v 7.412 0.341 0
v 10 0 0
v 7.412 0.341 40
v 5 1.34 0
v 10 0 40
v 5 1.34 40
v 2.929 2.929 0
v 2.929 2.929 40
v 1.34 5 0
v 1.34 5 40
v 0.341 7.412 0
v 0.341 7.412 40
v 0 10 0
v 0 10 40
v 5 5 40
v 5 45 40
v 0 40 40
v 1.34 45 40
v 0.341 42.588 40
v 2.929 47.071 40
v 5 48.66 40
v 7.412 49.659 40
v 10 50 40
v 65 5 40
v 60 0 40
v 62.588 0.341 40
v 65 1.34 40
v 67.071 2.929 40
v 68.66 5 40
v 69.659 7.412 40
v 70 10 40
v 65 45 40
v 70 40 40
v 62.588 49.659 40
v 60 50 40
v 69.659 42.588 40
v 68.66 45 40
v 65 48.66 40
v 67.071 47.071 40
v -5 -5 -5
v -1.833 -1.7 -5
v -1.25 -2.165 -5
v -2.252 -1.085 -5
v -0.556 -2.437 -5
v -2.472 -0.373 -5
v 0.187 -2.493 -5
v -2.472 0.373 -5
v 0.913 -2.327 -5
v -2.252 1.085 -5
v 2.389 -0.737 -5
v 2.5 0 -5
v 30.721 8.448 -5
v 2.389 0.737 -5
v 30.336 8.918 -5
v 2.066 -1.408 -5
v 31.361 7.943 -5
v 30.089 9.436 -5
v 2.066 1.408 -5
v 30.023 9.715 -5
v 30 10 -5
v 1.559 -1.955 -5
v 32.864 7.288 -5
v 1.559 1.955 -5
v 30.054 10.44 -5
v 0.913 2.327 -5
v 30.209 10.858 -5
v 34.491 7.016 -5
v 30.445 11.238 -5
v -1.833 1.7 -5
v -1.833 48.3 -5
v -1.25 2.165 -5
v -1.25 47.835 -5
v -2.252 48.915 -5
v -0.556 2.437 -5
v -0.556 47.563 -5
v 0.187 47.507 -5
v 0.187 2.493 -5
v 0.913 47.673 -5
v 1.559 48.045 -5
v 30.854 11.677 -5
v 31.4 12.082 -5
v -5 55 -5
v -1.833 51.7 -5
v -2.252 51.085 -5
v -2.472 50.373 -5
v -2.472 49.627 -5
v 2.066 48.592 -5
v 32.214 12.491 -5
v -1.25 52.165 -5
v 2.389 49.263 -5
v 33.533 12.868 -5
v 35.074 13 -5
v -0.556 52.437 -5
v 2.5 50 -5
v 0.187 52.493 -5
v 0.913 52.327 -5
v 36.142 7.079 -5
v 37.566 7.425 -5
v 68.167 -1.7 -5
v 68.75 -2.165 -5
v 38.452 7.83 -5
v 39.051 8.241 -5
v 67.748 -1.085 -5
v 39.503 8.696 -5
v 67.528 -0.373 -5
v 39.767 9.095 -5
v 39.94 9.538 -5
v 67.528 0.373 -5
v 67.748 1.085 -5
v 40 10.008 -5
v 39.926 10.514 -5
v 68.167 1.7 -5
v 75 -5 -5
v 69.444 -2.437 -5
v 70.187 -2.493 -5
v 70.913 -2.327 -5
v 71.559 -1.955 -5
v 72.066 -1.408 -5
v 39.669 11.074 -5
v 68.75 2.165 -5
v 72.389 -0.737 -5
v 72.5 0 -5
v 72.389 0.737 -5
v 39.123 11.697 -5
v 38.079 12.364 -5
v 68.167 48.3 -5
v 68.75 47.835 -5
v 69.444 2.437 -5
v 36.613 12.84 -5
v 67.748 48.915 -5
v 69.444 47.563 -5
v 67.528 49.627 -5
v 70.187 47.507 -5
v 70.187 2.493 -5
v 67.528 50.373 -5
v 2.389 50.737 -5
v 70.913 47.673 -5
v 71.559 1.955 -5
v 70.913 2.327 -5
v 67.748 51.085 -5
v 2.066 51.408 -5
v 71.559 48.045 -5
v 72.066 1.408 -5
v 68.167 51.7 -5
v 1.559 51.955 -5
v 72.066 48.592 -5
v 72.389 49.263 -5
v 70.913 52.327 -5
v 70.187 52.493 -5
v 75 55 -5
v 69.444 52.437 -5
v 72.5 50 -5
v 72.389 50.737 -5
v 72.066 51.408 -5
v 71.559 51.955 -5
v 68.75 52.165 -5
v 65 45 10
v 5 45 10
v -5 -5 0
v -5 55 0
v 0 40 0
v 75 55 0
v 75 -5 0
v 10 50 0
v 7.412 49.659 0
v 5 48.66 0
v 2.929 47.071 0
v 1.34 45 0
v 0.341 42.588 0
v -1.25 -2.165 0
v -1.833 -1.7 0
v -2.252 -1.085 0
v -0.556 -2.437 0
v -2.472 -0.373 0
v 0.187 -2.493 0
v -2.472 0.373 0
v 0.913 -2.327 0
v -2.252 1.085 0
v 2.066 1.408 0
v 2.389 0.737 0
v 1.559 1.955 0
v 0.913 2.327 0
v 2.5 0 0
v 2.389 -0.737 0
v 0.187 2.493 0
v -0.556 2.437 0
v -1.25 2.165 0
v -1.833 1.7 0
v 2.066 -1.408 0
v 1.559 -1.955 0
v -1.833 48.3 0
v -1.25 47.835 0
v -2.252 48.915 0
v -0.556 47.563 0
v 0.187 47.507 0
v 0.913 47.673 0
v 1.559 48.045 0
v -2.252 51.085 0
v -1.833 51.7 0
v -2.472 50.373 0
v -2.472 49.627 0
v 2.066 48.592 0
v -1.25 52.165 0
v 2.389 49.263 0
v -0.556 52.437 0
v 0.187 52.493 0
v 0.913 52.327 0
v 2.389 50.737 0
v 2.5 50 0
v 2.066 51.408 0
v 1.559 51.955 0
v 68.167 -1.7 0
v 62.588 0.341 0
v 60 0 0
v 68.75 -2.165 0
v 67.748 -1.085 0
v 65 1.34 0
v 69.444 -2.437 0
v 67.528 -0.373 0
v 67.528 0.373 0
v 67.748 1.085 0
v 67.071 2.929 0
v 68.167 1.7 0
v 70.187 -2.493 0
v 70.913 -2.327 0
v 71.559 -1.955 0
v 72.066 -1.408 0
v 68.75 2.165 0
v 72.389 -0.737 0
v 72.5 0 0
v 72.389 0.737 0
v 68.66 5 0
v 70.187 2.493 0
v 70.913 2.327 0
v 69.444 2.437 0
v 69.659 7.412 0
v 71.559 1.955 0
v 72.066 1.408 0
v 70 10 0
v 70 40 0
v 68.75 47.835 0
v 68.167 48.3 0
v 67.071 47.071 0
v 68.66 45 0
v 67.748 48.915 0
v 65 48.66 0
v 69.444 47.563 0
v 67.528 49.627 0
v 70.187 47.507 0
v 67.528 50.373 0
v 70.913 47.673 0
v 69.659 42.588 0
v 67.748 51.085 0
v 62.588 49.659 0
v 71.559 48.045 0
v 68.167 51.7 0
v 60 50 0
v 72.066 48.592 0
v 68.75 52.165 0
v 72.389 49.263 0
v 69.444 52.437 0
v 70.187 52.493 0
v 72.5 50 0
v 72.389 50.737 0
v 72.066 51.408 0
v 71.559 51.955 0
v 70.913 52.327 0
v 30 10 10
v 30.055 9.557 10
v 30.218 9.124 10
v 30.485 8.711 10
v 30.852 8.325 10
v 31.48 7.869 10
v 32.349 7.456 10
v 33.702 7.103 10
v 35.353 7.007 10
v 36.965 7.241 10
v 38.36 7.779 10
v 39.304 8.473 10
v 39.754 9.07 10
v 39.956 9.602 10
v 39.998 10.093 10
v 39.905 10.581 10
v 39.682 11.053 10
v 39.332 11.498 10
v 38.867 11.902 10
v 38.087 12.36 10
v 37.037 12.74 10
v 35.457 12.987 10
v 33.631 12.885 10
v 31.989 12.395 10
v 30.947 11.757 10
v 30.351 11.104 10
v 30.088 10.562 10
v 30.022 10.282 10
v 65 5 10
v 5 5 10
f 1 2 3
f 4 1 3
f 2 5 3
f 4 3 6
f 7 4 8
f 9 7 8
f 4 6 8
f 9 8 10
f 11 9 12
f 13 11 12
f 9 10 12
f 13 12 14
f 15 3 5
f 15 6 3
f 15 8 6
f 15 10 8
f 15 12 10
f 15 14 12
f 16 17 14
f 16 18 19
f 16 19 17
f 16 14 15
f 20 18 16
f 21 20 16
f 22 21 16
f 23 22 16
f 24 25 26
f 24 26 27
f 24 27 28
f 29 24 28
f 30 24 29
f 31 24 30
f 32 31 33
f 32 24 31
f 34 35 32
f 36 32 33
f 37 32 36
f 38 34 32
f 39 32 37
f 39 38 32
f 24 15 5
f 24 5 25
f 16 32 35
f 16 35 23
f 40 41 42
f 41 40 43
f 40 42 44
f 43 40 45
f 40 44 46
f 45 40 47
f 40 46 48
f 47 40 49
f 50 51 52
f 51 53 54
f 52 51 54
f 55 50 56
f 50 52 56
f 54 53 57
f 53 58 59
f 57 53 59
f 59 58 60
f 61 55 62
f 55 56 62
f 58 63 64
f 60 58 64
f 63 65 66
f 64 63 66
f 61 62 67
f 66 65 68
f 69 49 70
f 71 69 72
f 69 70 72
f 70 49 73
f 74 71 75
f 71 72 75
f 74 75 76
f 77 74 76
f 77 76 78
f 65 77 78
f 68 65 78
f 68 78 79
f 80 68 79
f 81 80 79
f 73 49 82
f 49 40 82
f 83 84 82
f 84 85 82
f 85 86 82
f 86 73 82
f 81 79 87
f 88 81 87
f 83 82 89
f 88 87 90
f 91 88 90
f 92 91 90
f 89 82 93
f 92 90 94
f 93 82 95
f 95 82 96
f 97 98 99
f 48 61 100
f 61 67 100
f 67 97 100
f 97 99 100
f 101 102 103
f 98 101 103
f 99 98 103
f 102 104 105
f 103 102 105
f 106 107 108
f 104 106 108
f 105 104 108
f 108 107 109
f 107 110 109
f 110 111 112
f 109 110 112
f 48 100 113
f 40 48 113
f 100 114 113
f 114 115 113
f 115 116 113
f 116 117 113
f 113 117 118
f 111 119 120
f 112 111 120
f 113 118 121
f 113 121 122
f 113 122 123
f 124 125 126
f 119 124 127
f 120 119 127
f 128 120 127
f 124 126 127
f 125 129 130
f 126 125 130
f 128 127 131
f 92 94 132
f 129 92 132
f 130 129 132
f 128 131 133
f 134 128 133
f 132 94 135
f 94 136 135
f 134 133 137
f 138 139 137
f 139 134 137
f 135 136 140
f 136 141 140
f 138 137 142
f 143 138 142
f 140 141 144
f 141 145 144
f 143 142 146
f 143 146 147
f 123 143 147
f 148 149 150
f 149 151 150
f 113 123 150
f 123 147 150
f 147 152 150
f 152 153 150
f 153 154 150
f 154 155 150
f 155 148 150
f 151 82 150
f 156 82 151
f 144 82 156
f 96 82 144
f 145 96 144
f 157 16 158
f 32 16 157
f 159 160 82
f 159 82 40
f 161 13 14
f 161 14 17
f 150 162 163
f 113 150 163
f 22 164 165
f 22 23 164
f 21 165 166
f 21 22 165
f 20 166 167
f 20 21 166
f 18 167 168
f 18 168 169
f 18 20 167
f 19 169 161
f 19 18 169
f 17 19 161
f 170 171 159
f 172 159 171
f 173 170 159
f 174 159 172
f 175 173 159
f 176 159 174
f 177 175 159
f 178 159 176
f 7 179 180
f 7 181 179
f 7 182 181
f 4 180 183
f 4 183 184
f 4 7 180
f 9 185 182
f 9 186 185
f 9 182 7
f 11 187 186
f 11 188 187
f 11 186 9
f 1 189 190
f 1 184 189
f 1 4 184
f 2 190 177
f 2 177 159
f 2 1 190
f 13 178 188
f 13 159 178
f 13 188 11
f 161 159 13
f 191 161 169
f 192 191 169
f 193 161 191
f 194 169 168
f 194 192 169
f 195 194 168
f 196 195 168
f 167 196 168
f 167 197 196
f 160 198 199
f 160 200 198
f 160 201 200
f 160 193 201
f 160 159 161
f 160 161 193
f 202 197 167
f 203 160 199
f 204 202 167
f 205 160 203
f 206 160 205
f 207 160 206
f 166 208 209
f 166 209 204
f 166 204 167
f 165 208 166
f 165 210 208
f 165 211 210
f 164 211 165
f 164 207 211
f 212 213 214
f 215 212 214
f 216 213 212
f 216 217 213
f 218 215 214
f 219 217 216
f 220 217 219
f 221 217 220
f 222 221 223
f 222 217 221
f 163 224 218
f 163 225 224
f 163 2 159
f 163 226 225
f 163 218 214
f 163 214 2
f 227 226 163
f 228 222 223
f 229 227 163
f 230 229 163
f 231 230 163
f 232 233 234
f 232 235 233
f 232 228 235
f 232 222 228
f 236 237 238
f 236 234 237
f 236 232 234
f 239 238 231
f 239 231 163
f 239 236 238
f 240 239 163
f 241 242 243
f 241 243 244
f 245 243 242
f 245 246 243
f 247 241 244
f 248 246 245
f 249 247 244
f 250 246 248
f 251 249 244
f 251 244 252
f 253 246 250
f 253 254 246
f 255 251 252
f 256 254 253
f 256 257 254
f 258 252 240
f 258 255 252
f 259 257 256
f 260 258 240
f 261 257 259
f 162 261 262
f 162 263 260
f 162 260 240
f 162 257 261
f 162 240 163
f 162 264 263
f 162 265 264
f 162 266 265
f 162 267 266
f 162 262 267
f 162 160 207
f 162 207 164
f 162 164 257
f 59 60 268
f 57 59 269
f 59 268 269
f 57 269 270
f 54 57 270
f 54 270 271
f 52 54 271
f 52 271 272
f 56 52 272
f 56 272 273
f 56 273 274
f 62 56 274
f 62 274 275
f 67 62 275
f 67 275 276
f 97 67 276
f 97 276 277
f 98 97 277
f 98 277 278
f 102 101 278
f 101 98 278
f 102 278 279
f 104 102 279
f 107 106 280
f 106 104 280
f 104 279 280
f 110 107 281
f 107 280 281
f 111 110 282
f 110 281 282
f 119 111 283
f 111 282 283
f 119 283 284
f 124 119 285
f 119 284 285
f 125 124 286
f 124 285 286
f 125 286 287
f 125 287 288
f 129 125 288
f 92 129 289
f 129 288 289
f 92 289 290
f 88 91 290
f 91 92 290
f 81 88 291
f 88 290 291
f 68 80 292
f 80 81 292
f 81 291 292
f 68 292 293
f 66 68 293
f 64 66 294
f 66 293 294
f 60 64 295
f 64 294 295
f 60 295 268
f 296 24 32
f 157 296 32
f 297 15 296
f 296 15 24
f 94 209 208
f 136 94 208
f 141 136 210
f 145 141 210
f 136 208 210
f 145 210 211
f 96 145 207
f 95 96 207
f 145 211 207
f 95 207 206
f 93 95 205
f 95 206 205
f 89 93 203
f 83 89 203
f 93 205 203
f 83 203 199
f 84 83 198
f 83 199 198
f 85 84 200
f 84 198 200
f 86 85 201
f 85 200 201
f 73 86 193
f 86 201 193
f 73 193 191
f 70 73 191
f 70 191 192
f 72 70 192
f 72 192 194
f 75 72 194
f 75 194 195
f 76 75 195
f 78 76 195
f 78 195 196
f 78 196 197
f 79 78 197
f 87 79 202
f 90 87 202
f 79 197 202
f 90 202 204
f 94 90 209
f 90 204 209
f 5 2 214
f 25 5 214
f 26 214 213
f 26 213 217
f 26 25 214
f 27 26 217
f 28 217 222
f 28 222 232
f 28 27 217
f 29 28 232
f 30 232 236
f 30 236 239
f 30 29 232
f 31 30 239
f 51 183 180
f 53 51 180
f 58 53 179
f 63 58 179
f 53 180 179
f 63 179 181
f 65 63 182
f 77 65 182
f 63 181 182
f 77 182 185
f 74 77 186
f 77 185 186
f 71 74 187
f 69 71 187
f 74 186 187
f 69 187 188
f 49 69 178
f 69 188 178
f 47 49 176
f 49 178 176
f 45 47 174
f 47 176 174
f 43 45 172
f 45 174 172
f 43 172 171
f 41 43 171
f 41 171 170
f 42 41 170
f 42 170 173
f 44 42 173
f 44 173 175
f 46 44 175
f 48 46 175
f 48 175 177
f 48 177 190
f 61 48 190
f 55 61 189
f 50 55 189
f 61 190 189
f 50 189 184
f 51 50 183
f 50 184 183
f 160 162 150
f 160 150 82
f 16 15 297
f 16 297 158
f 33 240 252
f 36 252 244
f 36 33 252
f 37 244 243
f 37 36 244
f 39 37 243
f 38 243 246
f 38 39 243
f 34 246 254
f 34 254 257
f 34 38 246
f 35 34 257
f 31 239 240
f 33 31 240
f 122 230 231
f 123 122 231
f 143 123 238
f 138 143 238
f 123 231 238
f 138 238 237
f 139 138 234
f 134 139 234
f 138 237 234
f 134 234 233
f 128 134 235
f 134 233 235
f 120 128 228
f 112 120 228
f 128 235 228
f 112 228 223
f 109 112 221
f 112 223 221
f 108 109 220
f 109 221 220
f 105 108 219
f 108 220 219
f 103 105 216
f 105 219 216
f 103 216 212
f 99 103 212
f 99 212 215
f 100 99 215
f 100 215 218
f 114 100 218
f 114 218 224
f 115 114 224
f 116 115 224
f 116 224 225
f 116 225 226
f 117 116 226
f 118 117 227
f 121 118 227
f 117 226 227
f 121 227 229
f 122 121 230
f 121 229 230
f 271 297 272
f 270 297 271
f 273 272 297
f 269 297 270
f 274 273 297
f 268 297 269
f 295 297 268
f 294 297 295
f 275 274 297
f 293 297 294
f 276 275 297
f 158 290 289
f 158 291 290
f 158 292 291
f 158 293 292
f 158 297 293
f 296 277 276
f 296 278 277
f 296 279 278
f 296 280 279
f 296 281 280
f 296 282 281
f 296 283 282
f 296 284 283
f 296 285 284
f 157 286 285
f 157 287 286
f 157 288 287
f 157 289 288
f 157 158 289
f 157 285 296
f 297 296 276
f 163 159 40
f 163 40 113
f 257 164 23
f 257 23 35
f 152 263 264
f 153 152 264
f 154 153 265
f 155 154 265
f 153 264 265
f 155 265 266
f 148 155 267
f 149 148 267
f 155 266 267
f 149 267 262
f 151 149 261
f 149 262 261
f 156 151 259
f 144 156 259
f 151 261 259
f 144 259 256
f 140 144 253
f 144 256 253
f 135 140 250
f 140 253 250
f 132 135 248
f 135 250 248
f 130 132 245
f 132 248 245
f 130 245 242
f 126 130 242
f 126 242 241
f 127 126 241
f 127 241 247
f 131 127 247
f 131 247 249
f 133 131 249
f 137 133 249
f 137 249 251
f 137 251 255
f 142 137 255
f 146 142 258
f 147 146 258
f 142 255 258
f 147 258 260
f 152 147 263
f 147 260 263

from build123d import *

# Parameters (mm, degrees)
SKETCH1_W           = 70
SKETCH1_H           = 50
BOSS_EXTRUDE1_DEPTH = 40
SKETCH2_W           = 60
SKETCH2_H           = 40
CUT_EXTRUDE1_DEPTH  = 30
BOSS_EXTRUDE2_DEPTH = 5
FILLET1_R           = 10
SKETCH5_R           = 2.5
CUT_EXTRUDE2_DEPTH  = 5
SKETCH6_RX          = 5
SKETCH6_RY          = 3
CUT_EXTRUDE3_DEPTH  = 20


with BuildPart() as part:
    # Sketch1 → Boss-Extrude1 (new body)
    with BuildSketch(Plane.XY):
        with Locations((35, 25)):
            Rectangle(SKETCH1_W, SKETCH1_H)
    extrude(amount=BOSS_EXTRUDE1_DEPTH)

    # Sketch2 → Cut-Extrude1 (cut)
    with BuildSketch(Plane.XY.offset(40)):
        with Locations((35, 25)):
            Rectangle(SKETCH2_W, SKETCH2_H)
    extrude(amount=-CUT_EXTRUDE1_DEPTH, mode=Mode.SUBTRACT)

    # Sketch4 → Boss-Extrude2 (add)
    with BuildSketch(Plane(origin=(0, 0, 0), x_dir=(-1, 0, 0), z_dir=(0, 0, -1))):
        Polygon((-75, 50), (-75, 55), (5, 55), (5, -5), (-75, -5), align=None)
    extrude(amount=BOSS_EXTRUDE2_DEPTH)

    # Fillet1
    fillet1_edges = [part.edges().sort_by_distance(p)[0] for p in [
        (0, 50, 20),
        (70, 50, 20),
        (70, 0, 20),
        (0, 0, 20),
    ]]
    fillet(fillet1_edges, radius=FILLET1_R)

    # Sketch5 → Cut-Extrude2 (cut)
    with BuildSketch(Plane.XY):
        with Locations((0, 50)):
            Circle(SKETCH5_R)
        with Locations((70, 50)):
            Circle(SKETCH5_R)
        with Locations((70, 0)):
            Circle(SKETCH5_R)
        Circle(SKETCH5_R)
    extrude(amount=-CUT_EXTRUDE2_DEPTH, mode=Mode.SUBTRACT)

    # Sketch6 → Cut-Extrude3 (cut)
    with BuildSketch(Plane.XY.offset(10)):
        with Locations(Location((35, 10), (0, 0, 180))):
            Ellipse(SKETCH6_RX, SKETCH6_RY)
    extrude(amount=-CUT_EXTRUDE3_DEPTH, mode=Mode.SUBTRACT)


solid = part.part
